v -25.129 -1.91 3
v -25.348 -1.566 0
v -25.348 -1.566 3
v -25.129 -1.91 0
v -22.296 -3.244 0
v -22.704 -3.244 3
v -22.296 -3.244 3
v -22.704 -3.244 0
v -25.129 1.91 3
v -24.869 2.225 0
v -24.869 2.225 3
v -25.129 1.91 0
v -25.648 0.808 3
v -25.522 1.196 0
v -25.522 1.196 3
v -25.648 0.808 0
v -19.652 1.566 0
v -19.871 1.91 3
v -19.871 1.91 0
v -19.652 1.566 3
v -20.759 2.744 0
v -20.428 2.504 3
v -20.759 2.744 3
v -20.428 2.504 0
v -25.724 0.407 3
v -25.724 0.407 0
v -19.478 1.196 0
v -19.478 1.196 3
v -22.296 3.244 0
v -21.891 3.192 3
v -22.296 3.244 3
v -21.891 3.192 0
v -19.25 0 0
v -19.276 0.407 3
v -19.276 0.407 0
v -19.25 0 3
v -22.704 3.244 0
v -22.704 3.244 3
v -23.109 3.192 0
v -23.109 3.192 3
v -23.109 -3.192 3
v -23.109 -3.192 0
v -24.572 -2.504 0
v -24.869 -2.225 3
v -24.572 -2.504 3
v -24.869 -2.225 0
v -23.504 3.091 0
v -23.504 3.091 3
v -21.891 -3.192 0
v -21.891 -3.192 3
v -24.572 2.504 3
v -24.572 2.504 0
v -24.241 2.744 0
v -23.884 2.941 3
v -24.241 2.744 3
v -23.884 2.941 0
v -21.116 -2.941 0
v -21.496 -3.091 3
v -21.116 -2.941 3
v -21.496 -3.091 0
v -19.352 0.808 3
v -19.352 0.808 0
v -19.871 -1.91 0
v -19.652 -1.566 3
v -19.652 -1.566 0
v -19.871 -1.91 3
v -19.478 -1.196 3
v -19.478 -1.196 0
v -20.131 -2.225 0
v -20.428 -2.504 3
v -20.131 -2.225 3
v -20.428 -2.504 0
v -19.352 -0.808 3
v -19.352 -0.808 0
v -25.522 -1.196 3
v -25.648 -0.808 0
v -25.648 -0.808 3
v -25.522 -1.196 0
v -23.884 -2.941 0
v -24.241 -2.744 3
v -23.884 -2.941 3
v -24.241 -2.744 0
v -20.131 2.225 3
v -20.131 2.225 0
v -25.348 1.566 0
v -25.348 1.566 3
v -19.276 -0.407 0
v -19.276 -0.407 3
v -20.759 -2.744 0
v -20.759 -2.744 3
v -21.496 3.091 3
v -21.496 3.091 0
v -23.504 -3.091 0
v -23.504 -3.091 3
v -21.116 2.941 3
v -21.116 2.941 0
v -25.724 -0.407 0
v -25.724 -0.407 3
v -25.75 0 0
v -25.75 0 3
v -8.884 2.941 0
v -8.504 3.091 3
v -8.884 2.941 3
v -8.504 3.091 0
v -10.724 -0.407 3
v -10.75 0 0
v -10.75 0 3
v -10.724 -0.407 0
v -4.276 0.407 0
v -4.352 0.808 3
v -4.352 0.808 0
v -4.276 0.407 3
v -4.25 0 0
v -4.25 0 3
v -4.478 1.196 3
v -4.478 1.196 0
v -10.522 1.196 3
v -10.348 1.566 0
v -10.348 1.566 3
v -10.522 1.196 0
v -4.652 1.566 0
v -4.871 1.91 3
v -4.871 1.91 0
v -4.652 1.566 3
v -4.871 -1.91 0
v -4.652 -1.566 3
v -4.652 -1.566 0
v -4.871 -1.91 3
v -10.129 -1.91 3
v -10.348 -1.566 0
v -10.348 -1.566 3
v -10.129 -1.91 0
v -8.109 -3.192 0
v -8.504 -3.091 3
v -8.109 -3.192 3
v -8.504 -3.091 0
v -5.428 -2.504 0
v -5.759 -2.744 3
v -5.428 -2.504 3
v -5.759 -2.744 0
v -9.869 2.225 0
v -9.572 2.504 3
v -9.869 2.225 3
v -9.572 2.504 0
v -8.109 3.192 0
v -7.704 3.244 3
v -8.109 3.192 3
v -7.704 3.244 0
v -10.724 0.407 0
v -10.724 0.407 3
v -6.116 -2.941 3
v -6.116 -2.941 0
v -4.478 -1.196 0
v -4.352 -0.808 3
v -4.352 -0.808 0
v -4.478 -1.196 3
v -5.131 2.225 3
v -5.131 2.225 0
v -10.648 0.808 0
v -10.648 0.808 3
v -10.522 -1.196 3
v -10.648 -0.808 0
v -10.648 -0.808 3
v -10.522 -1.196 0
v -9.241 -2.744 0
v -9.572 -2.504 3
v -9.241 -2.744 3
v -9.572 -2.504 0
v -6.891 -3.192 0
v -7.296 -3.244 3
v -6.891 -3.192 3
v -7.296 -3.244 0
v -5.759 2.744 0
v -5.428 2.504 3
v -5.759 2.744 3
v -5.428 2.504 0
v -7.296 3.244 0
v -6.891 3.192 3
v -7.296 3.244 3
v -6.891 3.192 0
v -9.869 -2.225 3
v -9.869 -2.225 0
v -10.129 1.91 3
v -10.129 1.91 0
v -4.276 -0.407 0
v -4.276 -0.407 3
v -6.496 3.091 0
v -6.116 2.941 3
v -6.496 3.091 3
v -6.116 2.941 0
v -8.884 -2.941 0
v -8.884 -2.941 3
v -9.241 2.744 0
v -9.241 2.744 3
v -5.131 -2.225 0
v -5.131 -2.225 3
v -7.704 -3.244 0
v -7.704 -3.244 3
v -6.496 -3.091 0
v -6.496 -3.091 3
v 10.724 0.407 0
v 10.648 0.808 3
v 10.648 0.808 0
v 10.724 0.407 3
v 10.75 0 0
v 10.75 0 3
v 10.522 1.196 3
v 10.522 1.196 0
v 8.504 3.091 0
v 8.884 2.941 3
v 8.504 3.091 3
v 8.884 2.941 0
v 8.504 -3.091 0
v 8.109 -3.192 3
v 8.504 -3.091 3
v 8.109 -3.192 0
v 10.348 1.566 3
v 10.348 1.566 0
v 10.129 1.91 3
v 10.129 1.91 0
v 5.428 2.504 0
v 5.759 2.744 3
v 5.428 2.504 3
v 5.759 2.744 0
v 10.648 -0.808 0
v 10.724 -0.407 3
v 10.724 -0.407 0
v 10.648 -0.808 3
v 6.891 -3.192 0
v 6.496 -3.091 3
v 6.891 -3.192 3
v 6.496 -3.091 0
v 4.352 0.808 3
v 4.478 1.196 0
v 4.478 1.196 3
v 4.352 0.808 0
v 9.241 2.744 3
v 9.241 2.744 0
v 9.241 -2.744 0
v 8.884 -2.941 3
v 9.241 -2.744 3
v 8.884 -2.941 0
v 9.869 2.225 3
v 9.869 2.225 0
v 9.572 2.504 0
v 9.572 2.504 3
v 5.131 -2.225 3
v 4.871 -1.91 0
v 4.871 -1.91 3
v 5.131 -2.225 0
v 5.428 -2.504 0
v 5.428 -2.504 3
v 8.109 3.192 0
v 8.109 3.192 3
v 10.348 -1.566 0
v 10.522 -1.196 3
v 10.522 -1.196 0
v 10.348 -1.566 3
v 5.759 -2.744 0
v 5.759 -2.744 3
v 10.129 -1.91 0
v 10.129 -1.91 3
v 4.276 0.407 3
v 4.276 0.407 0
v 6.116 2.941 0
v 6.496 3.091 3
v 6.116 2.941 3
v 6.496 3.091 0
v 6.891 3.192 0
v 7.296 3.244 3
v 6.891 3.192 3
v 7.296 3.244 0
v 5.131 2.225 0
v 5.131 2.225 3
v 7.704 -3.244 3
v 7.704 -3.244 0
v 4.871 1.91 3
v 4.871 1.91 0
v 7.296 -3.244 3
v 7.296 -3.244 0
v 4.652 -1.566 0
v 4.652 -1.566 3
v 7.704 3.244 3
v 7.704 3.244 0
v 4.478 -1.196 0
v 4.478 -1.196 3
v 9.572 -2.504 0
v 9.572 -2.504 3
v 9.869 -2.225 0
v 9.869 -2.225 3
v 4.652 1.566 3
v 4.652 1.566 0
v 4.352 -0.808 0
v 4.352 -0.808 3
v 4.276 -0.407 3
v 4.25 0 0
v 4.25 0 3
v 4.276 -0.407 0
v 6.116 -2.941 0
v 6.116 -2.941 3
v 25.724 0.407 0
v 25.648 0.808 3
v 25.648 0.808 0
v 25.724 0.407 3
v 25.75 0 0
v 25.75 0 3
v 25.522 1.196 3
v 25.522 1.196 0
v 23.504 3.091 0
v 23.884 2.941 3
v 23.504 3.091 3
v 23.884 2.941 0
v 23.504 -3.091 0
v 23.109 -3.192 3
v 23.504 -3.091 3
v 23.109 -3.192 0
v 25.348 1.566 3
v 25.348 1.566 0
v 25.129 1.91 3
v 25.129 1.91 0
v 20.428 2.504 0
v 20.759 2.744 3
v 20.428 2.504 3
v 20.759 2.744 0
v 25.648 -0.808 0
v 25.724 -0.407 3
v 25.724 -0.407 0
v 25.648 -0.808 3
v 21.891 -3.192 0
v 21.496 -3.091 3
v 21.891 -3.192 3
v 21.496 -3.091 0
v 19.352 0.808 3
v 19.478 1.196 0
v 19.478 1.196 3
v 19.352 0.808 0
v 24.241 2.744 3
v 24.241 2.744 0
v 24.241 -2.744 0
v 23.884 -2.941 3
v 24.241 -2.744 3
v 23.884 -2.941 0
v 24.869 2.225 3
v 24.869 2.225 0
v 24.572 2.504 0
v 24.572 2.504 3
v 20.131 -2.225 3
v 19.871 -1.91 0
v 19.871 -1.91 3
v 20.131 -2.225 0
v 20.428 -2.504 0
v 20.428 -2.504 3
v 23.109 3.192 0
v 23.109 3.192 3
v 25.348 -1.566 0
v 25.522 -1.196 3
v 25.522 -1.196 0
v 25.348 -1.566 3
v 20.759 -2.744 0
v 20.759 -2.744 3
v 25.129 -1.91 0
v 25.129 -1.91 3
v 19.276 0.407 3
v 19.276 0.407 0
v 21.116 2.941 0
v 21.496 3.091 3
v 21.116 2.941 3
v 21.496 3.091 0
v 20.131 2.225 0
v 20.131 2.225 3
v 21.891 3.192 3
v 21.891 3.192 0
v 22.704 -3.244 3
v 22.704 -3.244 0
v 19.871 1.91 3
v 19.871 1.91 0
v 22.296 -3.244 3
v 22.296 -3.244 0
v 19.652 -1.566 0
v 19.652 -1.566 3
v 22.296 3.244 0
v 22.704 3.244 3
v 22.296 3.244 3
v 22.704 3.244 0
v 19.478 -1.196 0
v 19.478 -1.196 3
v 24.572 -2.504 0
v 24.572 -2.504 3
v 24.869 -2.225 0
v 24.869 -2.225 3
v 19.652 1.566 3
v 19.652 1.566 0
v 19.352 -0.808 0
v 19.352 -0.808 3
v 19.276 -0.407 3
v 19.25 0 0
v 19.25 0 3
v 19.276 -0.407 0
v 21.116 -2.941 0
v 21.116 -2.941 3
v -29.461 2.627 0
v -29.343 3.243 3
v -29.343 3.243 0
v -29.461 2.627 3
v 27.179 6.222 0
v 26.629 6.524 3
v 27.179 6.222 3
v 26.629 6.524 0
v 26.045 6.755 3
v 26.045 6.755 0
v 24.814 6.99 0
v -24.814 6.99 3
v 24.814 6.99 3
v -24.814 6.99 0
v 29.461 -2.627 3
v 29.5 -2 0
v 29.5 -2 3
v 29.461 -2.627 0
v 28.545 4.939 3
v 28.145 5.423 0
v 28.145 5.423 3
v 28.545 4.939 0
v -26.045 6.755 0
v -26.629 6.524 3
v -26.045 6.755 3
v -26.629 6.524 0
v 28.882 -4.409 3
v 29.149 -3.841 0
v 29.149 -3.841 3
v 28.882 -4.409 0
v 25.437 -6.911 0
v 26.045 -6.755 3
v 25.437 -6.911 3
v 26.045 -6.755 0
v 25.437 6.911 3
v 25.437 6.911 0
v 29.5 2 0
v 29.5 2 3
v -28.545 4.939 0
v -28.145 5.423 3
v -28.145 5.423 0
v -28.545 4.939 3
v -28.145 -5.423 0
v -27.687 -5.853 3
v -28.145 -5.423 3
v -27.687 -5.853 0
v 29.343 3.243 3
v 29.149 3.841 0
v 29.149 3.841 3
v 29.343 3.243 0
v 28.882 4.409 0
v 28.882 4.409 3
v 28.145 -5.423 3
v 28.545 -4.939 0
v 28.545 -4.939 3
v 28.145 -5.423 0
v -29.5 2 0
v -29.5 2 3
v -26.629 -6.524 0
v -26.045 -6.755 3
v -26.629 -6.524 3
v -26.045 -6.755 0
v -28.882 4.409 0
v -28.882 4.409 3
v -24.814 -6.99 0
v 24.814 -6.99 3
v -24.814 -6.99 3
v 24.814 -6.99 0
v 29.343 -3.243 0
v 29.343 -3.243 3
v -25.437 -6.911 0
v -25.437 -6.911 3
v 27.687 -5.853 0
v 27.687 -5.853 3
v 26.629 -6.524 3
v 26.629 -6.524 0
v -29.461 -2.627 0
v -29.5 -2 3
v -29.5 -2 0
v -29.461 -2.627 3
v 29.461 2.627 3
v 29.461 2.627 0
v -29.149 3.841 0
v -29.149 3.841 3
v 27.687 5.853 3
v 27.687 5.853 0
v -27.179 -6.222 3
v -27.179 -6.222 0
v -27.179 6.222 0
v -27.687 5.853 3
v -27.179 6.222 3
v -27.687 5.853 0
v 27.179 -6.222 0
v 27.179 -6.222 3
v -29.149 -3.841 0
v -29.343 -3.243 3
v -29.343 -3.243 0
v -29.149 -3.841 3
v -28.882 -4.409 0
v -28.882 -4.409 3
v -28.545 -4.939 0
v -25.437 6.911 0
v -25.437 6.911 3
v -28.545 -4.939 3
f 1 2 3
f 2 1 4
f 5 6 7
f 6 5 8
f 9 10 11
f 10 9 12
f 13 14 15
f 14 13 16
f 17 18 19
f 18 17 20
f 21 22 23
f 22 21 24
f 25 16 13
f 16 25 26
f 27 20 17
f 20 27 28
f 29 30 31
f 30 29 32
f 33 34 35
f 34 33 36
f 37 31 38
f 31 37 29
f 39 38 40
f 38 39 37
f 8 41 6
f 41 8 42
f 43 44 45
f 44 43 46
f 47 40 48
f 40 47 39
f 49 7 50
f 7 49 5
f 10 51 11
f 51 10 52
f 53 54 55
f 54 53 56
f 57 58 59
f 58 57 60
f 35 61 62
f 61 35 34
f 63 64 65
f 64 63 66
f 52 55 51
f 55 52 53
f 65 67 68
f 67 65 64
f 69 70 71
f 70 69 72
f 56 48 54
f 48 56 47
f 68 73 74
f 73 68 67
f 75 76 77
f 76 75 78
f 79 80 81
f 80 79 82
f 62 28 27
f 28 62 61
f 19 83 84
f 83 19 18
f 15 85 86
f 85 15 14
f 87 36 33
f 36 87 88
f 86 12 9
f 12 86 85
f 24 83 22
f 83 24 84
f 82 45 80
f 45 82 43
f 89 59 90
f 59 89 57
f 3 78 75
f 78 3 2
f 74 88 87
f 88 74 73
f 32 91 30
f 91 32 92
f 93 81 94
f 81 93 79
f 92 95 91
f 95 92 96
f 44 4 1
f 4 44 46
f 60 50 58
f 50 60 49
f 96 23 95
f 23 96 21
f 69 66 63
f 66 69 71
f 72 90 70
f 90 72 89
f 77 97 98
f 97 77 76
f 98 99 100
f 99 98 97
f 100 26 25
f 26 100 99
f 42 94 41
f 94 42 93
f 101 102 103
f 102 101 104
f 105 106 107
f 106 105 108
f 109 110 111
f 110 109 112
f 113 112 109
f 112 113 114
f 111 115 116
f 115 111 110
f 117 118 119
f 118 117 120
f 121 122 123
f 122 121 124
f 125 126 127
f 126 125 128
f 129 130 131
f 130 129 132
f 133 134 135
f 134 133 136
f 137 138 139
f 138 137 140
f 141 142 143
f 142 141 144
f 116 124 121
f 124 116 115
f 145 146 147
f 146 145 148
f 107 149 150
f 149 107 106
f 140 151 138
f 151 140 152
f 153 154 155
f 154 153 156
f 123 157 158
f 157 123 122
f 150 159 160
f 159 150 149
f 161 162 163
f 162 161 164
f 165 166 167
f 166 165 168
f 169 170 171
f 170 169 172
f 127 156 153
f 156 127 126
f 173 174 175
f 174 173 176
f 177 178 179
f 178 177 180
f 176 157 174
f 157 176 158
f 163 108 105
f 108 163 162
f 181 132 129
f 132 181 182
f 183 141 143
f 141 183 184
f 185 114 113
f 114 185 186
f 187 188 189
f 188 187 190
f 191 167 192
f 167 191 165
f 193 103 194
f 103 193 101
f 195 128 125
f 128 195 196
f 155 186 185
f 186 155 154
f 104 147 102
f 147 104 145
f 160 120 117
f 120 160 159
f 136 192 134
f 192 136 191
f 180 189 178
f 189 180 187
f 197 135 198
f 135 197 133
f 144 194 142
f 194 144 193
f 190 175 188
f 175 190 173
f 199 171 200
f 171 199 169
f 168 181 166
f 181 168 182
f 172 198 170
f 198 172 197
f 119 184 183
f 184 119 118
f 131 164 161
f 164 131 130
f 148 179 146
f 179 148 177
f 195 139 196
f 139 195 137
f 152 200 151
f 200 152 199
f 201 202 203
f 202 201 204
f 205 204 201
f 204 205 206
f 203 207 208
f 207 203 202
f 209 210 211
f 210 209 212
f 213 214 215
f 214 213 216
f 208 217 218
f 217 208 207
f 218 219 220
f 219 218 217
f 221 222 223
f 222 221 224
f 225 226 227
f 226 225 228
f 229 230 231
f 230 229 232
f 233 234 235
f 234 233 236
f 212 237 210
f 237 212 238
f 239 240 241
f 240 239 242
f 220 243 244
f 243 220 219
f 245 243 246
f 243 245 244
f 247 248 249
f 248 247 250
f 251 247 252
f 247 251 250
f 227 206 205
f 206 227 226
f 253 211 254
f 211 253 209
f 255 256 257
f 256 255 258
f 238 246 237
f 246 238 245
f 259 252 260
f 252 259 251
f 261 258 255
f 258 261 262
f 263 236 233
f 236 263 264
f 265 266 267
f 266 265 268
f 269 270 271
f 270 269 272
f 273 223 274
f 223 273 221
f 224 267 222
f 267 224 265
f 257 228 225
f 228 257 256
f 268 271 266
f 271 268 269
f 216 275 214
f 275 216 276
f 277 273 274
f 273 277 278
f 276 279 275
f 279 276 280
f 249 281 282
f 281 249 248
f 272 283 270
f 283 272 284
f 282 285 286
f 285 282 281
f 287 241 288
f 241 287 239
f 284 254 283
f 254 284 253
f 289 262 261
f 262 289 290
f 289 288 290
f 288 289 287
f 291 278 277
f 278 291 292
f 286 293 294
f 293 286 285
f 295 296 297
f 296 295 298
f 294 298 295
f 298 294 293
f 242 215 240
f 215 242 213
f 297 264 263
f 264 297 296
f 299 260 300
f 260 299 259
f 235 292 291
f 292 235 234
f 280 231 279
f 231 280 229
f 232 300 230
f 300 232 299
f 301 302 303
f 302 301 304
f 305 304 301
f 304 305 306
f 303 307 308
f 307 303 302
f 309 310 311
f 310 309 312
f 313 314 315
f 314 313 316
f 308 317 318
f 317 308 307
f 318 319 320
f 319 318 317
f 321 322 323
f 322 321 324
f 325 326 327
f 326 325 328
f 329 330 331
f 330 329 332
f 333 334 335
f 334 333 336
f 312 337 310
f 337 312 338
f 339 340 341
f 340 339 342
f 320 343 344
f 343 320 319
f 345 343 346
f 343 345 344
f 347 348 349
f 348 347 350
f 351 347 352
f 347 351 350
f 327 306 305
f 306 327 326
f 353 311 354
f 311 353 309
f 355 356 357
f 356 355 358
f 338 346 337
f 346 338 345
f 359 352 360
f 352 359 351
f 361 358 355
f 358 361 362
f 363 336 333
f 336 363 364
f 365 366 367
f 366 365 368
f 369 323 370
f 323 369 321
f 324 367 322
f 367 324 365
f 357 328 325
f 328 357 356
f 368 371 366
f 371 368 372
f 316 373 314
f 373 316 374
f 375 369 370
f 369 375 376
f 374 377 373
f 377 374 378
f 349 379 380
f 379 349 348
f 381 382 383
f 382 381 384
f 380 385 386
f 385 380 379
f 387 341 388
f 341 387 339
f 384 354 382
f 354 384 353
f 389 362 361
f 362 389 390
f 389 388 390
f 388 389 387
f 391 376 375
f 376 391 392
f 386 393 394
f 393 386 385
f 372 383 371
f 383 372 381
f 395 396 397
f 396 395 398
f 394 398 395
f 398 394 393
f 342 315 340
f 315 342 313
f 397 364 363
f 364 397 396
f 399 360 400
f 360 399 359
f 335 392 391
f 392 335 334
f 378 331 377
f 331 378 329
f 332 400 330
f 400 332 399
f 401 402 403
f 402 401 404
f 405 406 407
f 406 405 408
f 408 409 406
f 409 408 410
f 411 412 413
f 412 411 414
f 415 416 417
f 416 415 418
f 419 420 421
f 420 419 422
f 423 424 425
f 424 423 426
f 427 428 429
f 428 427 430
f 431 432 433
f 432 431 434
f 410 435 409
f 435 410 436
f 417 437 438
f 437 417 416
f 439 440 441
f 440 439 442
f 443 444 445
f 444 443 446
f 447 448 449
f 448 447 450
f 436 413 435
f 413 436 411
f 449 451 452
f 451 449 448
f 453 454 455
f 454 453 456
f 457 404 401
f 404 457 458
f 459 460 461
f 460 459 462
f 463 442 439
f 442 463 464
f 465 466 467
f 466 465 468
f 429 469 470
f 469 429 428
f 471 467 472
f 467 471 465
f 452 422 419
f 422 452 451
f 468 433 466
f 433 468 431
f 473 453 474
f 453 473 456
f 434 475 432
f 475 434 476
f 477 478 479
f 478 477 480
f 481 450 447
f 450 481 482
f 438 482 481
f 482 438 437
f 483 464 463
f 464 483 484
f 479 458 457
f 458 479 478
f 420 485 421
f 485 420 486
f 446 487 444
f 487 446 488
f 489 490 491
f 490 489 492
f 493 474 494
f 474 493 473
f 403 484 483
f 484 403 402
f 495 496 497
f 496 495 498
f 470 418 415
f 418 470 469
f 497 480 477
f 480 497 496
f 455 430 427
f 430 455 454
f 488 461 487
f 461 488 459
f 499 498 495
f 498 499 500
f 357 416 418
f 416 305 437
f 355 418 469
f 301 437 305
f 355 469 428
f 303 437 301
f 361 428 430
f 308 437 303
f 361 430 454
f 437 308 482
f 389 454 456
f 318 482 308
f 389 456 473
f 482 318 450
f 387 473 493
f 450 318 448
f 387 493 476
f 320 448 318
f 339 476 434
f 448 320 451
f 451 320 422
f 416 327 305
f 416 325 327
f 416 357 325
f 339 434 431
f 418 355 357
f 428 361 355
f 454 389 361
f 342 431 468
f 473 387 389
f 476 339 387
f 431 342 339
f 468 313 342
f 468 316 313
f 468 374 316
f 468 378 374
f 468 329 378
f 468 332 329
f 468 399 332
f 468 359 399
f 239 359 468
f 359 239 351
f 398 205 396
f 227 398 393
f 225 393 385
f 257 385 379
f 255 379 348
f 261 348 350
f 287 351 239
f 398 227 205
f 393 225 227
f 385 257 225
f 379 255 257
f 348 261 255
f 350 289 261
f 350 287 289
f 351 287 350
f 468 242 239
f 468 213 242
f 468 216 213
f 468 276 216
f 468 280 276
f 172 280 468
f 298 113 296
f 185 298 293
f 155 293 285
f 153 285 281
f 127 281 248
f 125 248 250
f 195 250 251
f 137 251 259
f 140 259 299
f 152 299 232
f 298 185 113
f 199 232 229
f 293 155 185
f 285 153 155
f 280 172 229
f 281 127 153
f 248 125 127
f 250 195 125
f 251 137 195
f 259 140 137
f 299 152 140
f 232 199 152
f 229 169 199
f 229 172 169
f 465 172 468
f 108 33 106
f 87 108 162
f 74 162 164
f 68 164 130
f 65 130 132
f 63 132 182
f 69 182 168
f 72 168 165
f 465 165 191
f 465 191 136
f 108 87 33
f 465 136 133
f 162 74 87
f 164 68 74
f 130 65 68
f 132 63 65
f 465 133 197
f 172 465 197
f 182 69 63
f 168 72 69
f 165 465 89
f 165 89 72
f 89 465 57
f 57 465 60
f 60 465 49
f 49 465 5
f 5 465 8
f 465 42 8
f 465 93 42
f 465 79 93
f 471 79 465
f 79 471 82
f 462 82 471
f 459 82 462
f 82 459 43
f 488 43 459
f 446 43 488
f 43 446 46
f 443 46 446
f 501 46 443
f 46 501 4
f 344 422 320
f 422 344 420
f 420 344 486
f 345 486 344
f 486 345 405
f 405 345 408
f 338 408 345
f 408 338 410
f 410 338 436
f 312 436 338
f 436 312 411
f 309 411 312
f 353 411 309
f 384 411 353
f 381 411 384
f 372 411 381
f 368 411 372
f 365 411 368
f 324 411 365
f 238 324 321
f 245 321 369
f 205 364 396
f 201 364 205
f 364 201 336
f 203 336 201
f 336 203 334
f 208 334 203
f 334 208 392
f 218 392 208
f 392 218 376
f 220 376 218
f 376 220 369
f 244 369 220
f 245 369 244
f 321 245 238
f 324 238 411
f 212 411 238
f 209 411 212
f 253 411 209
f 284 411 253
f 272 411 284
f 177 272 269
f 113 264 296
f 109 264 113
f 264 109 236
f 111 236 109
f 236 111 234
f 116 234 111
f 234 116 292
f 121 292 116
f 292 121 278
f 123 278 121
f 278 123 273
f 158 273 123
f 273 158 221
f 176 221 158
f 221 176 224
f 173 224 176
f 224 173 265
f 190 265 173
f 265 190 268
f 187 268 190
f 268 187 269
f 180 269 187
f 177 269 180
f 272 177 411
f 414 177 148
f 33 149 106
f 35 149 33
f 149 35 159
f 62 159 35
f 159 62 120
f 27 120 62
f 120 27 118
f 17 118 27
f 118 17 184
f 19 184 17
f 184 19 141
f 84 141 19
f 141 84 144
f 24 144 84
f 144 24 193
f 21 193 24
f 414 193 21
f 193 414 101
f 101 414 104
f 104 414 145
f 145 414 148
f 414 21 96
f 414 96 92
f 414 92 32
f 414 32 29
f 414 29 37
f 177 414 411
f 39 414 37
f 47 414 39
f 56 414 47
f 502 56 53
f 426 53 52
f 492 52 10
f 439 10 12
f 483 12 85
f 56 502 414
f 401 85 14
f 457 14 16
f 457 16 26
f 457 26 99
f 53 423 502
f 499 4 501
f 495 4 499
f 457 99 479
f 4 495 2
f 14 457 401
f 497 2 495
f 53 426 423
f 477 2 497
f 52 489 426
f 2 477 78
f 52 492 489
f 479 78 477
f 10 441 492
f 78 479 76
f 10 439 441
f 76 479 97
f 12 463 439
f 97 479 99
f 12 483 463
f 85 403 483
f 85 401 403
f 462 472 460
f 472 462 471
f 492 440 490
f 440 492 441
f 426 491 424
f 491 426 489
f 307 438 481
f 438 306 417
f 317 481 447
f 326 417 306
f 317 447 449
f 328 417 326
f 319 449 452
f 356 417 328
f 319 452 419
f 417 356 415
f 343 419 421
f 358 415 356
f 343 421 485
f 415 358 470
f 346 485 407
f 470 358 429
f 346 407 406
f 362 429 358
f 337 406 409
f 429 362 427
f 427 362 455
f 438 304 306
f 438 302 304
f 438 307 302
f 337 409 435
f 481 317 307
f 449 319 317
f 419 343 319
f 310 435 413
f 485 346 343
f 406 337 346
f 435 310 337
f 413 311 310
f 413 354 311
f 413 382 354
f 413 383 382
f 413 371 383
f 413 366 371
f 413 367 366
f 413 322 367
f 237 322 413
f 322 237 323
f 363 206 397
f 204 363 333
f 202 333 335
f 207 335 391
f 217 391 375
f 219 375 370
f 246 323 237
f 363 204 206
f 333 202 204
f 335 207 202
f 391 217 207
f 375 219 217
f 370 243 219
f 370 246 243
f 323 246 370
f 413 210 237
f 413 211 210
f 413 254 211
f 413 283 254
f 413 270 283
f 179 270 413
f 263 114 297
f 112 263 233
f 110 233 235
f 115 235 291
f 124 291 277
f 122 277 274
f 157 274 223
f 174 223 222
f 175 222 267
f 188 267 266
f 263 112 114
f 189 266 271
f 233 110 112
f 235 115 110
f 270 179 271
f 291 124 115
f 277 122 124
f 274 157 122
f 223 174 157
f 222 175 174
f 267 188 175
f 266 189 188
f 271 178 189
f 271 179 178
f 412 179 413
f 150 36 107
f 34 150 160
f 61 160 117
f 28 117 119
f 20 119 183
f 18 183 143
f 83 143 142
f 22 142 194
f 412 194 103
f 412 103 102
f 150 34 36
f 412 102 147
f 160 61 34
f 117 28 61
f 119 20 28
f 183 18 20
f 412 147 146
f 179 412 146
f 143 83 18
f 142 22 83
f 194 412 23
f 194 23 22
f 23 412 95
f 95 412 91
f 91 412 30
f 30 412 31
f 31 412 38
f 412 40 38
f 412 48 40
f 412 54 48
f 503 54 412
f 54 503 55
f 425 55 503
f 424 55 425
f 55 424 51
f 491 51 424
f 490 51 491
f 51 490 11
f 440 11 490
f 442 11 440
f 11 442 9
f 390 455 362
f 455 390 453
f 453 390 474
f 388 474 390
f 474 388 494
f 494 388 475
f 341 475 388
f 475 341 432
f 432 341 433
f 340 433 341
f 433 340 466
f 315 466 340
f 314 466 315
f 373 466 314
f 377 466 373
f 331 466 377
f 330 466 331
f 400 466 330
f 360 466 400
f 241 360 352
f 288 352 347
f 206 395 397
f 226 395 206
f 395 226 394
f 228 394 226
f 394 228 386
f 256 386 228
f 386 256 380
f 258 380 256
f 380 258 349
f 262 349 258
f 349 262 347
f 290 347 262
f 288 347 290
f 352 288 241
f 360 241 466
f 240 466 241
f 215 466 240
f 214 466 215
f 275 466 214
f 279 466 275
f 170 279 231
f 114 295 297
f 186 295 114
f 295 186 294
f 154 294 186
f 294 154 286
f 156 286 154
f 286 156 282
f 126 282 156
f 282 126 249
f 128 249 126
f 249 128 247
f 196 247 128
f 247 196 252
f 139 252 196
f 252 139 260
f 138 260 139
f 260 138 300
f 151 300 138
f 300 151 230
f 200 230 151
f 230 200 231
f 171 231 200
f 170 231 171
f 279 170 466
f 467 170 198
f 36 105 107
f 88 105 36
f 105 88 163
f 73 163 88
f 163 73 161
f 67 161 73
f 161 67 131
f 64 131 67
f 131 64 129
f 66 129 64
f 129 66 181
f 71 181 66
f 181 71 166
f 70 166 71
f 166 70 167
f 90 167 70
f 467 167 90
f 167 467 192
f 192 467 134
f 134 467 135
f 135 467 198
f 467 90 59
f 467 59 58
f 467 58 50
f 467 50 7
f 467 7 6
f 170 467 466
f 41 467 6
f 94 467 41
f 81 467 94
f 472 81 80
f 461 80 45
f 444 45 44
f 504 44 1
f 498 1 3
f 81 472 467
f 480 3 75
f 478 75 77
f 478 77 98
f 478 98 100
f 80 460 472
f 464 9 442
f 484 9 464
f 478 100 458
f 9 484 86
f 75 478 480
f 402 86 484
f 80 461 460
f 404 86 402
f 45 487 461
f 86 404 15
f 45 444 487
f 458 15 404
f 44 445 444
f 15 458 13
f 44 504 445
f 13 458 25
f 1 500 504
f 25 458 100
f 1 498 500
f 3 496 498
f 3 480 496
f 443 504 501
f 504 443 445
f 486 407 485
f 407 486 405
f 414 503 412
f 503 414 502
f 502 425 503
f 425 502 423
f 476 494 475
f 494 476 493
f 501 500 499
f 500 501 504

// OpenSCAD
$fn = 50;


difference() {
	union() {
		hull() {
			translate(v = [-24.5000000000, 2.0000000000, 0]) {
				cylinder(h = 3, r = 5);
			}
			translate(v = [24.5000000000, 2.0000000000, 0]) {
				cylinder(h = 3, r = 5);
			}
			translate(v = [-24.5000000000, -2.0000000000, 0]) {
				cylinder(h = 3, r = 5);
			}
			translate(v = [24.5000000000, -2.0000000000, 0]) {
				cylinder(h = 3, r = 5);
			}
		}
	}
	union() {
		translate(v = [-22.5000000000, 0.0000000000, 0]) {
			translate(v = [0, 0, -100]) {
				cylinder(h = 200, r = 3.2500000000);
			}
		}
		translate(v = [-7.5000000000, 0.0000000000, 0]) {
			translate(v = [0, 0, -100]) {
				cylinder(h = 200, r = 3.2500000000);
			}
		}
		translate(v = [7.5000000000, 0.0000000000, 0]) {
			translate(v = [0, 0, -100]) {
				cylinder(h = 200, r = 3.2500000000);
			}
		}
		translate(v = [22.5000000000, 0.0000000000, 0]) {
			translate(v = [0, 0, -100]) {
				cylinder(h = 200, r = 3.2500000000);
			}
		}
	}
}
